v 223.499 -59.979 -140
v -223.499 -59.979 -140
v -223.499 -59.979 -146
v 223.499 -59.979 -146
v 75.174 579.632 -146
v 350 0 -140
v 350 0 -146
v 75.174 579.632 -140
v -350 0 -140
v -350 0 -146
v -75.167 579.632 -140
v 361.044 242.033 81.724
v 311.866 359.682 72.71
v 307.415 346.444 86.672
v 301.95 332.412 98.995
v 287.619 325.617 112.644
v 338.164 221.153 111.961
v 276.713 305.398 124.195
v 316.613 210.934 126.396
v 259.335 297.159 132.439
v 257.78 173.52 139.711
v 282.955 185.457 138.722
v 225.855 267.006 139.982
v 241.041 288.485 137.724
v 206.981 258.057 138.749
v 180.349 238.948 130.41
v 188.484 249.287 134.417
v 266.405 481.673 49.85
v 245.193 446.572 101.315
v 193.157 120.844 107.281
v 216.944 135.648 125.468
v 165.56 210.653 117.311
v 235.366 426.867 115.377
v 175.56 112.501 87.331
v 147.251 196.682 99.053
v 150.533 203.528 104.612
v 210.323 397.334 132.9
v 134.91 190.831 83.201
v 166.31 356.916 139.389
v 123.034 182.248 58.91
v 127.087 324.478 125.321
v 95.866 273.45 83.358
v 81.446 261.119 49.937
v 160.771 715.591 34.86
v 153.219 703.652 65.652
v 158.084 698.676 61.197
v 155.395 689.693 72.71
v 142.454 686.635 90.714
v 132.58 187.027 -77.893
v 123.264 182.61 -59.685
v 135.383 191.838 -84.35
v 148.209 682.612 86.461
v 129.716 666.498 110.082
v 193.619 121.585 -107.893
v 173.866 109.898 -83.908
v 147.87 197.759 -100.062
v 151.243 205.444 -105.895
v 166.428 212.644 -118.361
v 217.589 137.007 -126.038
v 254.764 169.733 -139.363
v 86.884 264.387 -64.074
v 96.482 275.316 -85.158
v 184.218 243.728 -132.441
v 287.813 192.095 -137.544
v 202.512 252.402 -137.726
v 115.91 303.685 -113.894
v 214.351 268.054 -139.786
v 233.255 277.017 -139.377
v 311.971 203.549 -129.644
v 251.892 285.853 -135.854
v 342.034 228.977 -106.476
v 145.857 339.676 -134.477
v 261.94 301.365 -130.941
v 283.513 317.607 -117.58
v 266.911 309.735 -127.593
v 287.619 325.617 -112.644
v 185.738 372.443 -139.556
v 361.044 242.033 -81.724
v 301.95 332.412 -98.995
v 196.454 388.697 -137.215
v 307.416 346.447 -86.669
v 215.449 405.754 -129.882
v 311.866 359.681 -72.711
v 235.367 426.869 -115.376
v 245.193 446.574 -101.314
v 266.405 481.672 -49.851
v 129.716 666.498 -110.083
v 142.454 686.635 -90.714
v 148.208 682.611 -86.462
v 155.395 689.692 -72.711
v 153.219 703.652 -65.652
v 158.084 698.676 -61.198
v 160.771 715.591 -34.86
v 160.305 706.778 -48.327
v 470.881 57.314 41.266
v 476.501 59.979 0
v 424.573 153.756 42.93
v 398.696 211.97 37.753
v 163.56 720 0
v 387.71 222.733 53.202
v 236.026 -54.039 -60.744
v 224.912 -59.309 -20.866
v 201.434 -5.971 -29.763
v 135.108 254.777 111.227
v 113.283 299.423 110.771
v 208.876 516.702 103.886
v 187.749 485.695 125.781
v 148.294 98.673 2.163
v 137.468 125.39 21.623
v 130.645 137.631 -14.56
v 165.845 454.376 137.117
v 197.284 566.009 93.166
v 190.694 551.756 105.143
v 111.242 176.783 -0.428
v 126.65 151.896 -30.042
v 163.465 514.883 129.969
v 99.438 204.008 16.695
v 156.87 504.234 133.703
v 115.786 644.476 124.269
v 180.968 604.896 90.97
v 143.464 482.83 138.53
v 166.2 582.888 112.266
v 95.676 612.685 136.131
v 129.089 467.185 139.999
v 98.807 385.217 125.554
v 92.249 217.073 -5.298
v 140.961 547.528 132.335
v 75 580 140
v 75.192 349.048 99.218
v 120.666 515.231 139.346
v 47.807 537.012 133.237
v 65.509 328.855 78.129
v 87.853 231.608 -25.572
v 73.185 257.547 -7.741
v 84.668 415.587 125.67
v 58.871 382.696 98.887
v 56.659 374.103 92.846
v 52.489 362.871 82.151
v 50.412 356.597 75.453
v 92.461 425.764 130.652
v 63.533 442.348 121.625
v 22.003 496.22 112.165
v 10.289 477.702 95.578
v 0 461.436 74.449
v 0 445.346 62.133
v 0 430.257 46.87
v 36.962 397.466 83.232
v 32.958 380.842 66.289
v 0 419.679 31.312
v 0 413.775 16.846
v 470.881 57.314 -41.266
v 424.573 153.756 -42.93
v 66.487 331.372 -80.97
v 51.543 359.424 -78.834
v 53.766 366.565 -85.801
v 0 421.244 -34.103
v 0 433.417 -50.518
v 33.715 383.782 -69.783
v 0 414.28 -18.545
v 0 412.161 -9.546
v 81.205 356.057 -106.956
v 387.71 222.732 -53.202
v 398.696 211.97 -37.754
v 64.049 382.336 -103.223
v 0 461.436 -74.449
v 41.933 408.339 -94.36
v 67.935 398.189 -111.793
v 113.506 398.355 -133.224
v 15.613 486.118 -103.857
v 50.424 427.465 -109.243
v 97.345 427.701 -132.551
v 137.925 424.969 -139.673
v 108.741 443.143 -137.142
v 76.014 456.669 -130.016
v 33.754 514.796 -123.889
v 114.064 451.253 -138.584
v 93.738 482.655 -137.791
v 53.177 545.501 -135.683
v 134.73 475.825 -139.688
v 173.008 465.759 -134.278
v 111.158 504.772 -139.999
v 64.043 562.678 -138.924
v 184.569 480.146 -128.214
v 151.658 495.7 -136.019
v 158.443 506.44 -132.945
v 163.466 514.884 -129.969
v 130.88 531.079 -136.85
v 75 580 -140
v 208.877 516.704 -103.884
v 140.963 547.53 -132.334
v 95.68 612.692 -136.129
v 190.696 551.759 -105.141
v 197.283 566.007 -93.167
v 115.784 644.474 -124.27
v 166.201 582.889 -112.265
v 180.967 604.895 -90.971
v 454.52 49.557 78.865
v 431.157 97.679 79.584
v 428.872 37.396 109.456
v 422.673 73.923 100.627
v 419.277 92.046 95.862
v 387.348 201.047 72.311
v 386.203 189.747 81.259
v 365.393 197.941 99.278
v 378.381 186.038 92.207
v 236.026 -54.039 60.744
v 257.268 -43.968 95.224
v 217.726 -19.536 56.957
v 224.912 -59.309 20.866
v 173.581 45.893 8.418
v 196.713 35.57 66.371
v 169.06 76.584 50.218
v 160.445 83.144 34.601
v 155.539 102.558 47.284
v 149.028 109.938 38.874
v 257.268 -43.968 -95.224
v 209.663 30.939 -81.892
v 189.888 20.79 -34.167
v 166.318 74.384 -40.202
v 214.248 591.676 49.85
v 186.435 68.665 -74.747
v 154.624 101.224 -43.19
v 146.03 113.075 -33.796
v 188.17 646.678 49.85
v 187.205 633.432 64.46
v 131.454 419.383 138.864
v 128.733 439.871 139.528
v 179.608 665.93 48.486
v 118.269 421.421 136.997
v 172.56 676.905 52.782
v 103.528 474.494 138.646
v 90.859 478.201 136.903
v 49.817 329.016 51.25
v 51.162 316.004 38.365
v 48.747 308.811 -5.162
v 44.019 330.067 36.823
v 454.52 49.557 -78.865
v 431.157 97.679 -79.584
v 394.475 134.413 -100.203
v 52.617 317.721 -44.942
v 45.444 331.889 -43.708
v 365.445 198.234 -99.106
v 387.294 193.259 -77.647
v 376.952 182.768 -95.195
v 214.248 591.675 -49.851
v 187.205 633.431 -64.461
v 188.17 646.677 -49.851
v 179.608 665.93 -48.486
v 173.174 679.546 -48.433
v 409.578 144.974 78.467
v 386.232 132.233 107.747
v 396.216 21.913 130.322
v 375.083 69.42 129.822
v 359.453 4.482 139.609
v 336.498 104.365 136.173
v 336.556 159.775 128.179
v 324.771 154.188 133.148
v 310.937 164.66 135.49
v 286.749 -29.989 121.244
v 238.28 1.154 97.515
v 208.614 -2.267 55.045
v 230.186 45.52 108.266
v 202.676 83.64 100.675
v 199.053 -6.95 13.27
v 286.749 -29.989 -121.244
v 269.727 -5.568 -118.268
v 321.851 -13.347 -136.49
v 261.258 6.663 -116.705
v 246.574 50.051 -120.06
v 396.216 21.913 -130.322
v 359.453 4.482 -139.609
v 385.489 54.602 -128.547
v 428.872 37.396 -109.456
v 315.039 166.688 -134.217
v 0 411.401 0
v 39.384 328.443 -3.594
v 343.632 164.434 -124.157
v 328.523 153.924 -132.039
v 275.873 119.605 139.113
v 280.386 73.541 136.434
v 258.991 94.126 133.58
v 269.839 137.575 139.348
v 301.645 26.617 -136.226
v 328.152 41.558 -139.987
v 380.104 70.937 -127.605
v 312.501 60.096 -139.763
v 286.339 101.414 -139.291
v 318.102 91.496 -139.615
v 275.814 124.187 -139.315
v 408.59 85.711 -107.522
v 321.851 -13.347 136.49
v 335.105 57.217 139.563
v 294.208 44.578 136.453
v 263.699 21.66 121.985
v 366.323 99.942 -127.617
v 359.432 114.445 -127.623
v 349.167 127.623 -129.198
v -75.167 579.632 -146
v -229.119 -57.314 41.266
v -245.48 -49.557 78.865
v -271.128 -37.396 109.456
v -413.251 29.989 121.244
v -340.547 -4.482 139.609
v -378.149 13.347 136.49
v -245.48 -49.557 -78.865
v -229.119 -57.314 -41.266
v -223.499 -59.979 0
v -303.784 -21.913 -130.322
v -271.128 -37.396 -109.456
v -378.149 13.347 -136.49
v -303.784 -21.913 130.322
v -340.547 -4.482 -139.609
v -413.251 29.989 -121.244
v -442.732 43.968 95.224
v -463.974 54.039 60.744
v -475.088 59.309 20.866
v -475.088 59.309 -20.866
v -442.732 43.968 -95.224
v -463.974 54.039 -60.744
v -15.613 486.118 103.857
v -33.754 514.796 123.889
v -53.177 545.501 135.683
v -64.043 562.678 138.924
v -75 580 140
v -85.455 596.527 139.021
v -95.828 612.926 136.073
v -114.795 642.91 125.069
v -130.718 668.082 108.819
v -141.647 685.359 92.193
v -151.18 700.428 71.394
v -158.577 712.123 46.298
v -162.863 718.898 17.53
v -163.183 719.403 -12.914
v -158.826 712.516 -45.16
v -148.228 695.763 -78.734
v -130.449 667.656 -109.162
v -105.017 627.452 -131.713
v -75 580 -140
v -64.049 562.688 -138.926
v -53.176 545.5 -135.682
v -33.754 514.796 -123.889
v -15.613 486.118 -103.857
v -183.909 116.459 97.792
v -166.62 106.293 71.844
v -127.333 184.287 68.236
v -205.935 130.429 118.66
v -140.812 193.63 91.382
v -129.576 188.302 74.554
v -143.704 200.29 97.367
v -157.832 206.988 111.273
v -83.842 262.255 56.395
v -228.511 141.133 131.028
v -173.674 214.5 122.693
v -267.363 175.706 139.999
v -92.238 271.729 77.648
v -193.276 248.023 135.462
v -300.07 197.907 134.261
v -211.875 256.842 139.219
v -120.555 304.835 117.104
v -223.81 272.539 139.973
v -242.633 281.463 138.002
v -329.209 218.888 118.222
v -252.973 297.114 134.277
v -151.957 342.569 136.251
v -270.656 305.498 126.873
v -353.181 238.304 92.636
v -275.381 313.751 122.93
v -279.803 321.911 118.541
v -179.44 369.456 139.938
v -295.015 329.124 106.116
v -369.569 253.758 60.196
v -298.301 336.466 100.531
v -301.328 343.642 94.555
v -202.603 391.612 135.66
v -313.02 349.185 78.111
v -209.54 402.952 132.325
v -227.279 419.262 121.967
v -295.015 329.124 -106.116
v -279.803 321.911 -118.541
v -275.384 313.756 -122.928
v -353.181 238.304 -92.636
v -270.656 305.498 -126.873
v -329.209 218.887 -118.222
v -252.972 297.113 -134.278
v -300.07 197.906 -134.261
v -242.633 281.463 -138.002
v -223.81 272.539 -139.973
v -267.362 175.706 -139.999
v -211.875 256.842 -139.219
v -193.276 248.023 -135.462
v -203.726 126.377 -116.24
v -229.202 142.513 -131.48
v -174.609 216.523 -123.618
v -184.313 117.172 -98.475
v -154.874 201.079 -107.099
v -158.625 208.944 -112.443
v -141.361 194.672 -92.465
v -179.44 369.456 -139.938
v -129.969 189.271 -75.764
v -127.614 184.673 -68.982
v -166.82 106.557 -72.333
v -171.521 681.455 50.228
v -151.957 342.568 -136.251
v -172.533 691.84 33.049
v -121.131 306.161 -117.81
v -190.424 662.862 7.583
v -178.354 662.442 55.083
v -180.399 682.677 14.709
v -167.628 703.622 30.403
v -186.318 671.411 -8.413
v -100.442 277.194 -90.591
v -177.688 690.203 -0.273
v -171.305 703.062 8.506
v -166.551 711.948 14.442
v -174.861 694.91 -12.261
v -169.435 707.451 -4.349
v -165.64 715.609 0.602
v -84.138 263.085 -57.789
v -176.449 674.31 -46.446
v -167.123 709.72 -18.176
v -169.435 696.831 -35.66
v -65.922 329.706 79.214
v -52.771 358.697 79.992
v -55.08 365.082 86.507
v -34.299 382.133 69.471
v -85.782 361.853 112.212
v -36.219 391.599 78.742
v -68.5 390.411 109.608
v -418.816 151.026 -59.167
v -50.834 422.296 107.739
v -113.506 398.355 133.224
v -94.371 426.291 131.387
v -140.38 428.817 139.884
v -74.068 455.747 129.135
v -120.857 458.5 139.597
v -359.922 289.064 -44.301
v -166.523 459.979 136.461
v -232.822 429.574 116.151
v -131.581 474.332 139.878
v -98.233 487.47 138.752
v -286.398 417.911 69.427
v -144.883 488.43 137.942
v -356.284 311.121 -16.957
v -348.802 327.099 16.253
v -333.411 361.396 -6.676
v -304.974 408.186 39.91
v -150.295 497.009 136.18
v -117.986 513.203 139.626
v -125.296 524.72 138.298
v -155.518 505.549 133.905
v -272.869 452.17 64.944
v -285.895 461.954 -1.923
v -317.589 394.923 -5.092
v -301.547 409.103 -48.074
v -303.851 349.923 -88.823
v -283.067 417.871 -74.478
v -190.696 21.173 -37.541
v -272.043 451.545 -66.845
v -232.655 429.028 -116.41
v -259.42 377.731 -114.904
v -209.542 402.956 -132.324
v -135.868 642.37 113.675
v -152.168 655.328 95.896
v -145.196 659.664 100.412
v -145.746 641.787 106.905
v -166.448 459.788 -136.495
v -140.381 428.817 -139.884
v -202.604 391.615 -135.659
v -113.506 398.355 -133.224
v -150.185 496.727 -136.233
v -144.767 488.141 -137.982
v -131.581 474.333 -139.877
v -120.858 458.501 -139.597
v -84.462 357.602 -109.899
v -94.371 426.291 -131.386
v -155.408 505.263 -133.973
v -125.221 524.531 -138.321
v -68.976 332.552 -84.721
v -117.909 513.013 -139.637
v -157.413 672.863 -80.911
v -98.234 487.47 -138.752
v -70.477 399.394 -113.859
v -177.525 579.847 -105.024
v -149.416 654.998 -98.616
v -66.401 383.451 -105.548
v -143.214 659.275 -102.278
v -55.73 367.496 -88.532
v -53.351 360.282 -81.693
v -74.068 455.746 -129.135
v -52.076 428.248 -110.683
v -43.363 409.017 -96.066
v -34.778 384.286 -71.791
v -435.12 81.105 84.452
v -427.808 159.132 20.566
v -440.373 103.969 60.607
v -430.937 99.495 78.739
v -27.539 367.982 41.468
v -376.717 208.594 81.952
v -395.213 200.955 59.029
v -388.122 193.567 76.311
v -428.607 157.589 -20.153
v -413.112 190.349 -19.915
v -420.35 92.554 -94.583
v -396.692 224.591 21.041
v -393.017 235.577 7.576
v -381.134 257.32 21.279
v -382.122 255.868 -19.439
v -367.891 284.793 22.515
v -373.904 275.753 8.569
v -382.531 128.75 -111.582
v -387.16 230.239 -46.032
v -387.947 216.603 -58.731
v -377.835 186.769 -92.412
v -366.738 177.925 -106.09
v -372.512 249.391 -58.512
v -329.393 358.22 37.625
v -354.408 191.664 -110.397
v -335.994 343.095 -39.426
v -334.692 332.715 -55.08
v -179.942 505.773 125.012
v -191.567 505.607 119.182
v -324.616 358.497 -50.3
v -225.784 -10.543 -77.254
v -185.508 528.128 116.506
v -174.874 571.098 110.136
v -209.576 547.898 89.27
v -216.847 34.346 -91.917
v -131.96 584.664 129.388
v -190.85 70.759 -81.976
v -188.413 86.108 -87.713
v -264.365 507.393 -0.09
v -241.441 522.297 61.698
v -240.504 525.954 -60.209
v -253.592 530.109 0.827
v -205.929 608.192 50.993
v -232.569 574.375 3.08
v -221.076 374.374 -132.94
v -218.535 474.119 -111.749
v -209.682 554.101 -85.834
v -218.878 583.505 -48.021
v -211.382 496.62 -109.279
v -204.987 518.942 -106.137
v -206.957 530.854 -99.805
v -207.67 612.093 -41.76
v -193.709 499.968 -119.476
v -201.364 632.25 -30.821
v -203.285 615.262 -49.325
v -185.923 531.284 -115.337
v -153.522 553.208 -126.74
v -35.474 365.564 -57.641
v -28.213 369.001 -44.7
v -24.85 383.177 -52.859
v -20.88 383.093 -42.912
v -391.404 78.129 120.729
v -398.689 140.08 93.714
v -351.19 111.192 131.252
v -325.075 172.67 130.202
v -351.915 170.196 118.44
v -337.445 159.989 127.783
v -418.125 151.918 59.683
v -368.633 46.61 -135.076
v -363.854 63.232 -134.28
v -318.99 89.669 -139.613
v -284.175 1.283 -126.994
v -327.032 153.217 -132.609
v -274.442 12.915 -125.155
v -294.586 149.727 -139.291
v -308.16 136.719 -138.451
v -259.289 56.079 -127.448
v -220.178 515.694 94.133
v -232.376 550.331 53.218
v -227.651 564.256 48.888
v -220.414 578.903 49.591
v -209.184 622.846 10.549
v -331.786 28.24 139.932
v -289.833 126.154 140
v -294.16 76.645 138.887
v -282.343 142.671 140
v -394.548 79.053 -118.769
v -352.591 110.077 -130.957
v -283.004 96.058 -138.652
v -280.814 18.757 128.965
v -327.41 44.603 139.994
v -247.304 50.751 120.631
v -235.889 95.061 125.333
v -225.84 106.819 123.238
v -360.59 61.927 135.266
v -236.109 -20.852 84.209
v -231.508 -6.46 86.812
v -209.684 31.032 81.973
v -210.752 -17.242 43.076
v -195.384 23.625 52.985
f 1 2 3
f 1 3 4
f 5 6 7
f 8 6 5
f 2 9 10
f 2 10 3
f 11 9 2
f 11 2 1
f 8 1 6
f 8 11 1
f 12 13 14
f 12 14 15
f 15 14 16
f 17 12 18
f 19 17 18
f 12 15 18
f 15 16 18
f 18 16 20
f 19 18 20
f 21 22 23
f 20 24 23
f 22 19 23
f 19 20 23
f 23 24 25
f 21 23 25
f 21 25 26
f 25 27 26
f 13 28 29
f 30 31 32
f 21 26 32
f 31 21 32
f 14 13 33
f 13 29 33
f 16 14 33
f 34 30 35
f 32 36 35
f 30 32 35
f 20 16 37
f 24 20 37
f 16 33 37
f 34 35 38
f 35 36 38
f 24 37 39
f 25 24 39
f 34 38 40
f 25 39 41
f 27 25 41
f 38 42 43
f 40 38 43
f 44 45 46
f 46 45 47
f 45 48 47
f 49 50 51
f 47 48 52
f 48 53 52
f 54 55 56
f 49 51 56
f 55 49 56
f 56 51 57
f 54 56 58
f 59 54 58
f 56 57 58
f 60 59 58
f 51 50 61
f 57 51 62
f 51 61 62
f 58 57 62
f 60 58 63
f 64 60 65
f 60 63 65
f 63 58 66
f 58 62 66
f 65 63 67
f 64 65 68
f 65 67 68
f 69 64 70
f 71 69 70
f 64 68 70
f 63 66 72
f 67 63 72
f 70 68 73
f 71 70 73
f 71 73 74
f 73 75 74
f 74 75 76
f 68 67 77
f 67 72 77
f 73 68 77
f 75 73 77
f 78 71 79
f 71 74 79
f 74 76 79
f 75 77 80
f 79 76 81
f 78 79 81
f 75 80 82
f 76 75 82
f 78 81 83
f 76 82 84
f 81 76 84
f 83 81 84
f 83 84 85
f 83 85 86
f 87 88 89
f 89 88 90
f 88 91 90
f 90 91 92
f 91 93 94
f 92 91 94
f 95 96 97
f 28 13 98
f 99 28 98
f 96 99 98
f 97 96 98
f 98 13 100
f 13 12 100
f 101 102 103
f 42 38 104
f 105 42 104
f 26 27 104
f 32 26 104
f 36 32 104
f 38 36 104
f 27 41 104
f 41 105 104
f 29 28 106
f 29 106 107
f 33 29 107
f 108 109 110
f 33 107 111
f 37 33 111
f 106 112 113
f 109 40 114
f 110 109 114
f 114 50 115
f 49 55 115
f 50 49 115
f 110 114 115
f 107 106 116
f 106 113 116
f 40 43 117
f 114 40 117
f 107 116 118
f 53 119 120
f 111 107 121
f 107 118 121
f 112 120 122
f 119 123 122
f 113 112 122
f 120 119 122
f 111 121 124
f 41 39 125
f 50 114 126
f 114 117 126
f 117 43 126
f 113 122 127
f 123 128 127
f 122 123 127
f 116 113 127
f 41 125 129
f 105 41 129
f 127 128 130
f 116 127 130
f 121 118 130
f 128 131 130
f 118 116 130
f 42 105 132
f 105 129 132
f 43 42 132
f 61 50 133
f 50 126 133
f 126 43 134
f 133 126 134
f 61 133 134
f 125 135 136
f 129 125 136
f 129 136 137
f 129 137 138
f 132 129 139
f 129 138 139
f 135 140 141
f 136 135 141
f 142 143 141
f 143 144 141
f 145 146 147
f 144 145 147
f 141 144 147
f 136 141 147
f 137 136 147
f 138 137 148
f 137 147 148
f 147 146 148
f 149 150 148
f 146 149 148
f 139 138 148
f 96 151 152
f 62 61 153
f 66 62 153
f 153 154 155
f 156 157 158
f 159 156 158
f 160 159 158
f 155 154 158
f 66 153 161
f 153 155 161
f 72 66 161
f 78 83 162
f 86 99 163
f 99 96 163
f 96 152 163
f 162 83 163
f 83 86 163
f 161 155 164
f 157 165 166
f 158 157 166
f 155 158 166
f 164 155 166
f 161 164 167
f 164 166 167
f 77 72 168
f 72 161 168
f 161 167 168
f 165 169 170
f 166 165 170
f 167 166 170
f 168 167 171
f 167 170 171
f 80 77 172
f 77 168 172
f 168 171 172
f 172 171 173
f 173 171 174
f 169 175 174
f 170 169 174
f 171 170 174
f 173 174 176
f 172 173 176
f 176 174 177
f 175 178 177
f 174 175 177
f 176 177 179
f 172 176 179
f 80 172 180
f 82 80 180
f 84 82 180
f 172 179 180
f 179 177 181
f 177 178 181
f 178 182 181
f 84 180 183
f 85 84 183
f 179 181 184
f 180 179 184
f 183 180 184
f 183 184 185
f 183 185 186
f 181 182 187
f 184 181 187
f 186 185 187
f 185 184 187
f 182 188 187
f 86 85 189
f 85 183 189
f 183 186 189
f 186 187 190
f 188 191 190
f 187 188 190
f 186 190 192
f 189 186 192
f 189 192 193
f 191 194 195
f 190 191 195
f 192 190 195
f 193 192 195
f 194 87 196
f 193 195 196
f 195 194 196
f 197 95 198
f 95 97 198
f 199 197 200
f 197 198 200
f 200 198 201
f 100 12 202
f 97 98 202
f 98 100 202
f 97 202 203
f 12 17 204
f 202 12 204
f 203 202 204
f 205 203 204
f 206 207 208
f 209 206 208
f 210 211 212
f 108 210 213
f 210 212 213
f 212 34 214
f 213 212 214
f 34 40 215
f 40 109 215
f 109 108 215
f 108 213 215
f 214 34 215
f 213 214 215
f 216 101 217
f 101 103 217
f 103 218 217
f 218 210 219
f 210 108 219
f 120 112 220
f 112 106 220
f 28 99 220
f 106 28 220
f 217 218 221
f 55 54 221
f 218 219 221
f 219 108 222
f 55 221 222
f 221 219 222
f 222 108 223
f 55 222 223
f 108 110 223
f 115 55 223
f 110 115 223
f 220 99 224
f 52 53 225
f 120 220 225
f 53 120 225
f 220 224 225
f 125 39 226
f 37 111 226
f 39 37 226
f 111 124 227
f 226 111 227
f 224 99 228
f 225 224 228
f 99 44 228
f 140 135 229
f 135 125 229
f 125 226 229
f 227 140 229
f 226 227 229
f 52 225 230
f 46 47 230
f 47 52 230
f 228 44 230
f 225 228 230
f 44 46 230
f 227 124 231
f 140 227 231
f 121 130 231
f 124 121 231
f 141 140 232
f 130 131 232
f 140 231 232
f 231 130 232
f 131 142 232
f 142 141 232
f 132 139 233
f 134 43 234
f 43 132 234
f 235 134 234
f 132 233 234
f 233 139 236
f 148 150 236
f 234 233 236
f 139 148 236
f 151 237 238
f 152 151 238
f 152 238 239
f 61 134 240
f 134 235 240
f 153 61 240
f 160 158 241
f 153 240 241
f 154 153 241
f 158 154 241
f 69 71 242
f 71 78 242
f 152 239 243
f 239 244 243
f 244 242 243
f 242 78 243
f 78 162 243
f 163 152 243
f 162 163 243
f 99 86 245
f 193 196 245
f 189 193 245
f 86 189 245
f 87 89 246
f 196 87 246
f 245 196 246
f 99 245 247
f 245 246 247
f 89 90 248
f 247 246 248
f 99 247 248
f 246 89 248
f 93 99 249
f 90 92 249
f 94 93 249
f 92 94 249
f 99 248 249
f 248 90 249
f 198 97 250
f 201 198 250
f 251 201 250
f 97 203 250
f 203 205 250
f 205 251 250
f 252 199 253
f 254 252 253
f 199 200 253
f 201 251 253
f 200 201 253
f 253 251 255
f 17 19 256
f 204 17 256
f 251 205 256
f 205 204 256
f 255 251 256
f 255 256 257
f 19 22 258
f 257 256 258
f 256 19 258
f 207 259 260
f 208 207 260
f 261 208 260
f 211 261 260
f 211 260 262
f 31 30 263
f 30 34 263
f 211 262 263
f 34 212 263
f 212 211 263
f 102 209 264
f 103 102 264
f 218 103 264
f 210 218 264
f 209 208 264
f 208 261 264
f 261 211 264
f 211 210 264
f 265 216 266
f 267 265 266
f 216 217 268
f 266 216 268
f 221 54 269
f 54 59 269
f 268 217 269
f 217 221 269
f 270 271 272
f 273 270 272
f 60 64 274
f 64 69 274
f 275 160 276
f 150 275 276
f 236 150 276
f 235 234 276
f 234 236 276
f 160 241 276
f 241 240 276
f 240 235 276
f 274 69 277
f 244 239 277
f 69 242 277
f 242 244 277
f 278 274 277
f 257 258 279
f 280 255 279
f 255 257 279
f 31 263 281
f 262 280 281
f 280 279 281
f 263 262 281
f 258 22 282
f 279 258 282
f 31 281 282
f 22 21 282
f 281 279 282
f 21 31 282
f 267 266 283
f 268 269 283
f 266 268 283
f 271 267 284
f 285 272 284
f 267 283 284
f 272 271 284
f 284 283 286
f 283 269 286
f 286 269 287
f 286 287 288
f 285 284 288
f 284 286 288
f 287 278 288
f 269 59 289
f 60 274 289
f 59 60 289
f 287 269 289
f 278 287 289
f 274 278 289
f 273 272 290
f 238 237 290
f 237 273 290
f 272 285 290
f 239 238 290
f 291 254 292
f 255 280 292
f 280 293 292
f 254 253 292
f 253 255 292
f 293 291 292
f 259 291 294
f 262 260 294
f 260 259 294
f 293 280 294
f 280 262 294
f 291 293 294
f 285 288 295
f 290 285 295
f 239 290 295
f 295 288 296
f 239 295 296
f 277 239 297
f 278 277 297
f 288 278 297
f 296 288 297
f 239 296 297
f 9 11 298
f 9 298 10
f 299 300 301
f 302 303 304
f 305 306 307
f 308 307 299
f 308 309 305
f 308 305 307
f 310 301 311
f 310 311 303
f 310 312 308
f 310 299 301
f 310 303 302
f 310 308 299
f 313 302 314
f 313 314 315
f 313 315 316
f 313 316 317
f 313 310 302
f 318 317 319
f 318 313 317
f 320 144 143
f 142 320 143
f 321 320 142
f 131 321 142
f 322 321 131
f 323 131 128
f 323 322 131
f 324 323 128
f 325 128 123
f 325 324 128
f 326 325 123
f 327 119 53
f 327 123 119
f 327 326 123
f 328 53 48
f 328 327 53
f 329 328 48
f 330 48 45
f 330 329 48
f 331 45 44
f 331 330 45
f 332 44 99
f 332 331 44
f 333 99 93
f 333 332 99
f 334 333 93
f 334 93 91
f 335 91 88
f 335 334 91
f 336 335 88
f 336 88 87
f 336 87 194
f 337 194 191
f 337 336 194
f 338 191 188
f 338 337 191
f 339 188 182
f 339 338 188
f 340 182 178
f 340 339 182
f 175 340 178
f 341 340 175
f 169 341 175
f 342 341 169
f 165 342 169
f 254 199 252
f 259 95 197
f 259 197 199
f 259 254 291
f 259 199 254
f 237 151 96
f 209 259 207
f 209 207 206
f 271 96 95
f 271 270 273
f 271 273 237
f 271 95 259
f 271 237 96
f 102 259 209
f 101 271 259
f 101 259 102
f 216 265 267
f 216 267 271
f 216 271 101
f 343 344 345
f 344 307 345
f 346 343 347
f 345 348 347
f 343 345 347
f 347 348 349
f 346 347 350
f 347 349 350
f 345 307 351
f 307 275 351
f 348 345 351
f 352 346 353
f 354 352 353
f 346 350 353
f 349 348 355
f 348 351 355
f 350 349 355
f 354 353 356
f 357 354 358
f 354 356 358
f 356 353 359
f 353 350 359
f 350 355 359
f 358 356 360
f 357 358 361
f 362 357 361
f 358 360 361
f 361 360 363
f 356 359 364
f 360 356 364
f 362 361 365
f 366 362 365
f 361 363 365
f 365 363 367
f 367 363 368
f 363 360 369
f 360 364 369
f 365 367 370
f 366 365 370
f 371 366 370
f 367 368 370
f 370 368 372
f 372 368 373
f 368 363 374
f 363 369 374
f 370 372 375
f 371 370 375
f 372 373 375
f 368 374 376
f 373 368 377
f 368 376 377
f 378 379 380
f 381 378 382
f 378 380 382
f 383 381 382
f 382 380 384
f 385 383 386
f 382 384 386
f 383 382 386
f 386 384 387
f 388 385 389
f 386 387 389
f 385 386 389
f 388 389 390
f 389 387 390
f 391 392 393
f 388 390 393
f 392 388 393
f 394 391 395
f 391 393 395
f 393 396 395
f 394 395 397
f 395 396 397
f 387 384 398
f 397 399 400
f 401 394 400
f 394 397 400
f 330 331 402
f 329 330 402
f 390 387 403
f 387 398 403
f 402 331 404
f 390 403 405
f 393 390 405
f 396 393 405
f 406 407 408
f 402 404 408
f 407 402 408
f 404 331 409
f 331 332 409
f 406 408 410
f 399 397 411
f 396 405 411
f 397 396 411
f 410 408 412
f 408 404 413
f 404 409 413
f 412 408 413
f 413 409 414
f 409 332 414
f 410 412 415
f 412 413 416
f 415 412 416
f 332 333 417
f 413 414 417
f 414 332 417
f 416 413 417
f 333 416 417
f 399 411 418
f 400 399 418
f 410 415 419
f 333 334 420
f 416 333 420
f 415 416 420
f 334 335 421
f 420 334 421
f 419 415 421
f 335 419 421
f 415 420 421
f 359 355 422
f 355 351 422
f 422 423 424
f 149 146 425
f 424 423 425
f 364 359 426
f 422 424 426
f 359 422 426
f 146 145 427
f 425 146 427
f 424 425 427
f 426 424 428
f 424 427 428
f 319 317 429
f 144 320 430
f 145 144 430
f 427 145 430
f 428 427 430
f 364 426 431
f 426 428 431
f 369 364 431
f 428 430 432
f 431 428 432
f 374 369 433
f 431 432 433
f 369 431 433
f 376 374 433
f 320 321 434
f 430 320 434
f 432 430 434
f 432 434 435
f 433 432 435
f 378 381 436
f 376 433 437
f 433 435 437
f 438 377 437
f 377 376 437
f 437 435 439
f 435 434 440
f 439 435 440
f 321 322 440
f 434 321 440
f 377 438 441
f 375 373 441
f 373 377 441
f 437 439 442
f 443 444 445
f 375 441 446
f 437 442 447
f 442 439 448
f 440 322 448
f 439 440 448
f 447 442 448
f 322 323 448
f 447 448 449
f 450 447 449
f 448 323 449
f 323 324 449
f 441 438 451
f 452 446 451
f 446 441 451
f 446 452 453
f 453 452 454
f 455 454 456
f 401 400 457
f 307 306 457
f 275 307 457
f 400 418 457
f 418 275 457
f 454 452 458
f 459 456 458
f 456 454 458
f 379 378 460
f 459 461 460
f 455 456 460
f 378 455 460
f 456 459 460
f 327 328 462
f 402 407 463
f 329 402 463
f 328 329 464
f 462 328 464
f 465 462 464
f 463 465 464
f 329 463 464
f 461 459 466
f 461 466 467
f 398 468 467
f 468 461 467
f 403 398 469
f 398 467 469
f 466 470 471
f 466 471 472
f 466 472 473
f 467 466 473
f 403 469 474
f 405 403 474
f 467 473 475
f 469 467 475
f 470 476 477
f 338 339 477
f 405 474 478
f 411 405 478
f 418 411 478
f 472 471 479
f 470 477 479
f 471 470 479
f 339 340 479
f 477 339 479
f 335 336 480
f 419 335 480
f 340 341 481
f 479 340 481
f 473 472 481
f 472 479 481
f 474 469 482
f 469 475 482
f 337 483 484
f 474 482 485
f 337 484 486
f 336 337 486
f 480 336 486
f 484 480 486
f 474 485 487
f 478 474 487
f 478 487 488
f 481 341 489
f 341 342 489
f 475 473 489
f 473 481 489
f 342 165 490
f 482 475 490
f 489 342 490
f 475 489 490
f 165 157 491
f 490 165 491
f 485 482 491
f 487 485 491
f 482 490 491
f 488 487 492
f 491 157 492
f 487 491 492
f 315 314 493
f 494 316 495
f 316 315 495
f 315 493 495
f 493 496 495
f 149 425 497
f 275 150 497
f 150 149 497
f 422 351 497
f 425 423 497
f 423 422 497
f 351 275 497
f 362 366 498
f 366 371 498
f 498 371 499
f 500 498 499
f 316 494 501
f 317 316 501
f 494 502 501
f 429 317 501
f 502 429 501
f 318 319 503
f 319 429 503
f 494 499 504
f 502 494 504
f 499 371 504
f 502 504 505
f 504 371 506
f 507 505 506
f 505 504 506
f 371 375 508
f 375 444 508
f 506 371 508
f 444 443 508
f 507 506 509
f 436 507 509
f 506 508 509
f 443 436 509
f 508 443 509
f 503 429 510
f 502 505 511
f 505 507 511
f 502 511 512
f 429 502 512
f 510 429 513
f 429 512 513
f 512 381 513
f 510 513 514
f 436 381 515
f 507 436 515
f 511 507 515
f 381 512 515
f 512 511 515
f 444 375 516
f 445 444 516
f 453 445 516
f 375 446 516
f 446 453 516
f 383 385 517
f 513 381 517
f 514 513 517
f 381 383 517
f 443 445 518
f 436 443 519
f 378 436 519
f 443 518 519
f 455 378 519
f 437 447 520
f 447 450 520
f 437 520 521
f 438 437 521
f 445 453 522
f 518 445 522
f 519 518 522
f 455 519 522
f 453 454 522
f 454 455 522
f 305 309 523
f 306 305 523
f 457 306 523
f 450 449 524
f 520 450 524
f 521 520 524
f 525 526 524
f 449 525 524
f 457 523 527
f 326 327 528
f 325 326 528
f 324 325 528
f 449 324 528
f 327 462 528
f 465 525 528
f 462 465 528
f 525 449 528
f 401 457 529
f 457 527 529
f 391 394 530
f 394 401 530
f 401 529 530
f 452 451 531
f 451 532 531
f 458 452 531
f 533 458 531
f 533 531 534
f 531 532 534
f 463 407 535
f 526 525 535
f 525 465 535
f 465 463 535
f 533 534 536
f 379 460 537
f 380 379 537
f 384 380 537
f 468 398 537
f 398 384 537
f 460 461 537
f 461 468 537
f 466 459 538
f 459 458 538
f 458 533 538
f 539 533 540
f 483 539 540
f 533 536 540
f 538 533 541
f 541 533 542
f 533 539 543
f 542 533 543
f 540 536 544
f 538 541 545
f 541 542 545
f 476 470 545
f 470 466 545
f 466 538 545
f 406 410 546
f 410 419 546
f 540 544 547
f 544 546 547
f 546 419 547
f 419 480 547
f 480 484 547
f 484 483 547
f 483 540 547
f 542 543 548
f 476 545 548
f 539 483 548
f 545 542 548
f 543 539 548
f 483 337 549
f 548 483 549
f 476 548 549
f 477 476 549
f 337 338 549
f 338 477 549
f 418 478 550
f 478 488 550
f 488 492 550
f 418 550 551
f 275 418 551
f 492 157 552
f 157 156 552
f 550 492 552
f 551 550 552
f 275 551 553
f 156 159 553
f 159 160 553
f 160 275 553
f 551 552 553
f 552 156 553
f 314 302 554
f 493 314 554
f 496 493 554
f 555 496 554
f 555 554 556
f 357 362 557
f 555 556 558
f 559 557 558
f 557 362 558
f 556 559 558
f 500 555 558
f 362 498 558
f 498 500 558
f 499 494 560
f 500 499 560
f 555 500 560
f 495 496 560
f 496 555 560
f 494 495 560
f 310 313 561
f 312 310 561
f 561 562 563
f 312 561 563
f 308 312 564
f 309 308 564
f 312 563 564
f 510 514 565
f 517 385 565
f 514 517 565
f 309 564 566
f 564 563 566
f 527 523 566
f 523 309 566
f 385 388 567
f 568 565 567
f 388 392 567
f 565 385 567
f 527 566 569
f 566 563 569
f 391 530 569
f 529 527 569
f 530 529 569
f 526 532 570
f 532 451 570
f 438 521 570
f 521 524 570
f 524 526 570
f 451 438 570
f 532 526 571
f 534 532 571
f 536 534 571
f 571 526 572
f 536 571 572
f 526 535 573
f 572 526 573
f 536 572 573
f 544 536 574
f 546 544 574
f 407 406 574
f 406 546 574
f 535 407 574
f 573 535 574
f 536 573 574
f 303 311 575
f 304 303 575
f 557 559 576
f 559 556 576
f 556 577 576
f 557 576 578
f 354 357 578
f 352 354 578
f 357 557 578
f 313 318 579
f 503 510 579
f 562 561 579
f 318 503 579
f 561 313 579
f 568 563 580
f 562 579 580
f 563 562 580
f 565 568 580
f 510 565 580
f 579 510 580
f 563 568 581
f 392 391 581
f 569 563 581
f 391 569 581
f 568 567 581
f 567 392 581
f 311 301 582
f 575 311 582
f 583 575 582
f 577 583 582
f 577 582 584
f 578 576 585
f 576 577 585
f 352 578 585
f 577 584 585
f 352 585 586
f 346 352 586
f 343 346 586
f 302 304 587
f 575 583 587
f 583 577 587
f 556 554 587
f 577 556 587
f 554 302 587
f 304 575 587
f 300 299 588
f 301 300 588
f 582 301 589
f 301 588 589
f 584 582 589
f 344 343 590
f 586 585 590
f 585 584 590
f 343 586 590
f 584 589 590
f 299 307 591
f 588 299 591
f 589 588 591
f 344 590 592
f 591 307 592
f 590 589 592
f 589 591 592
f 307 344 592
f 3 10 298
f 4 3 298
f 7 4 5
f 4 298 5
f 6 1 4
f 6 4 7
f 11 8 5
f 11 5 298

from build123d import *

# Parameters (mm, degrees)
F2_R     = 140
F5_R     = 140
F9_DEPTH = 6


with BuildPart() as f3:
    # F3: sweep along a path in F0
    with BuildLine(Plane.XY) as f3_path:
        Line((-350, 0), (-75, 580))
        Line((-75, 580), (75, 580))
    # F2 (on line) → F3 (sweep)
    with BuildSketch(Plane(origin=(-64.2406407378, -135.4893513743, 0), x_dir=(0.9035791676, -0.4284211571, 0), z_dir=(-0.4284211571, -0.9035791676, 0))):
        with Locations((-316.252708671, 0)):
            Circle(F2_R)
    sweep(path=f3_path.line, transition=Transition.RIGHT)

    # F6: sweep along a path in F0
    with BuildLine(Plane.XY) as f6_path:
        Line((350, 0), (75, 580))
        Line((75, 580), (-75, 580))
    # F5 (on line) → F6 (sweep)
    with BuildSketch(Plane(origin=(64.2406407378, -135.4893513743, 0), x_dir=(0.9035791676, 0.4284211571, 0), z_dir=(0.4284211571, -0.9035791676, 0))):
        with Locations((316.252708671, 0)):
            Circle(F5_R)
    sweep(path=f6_path.line, transition=Transition.RIGHT)


with BuildPart() as f9:
    # F8 (on offset) → F9 (new body)
    with BuildSketch(Plane.XY.offset(-140)):
        Polygon((-223.4989165316, -59.9789619893), (0, 411.4005710591), (223.4989165316, -59.9789619893), (350, 0), (75.174340639, 579.6322997432), (-75.1671269536, 579.6322997432), (-350, 0), align=None)
        Polygon((223.4989165316, -59.9789619893), (0, 411.4005710591), (-223.4989165316, -59.9789619893), align=None)
    extrude(amount=-F9_DEPTH)


solid = Compound([f3.part, f9.part])
